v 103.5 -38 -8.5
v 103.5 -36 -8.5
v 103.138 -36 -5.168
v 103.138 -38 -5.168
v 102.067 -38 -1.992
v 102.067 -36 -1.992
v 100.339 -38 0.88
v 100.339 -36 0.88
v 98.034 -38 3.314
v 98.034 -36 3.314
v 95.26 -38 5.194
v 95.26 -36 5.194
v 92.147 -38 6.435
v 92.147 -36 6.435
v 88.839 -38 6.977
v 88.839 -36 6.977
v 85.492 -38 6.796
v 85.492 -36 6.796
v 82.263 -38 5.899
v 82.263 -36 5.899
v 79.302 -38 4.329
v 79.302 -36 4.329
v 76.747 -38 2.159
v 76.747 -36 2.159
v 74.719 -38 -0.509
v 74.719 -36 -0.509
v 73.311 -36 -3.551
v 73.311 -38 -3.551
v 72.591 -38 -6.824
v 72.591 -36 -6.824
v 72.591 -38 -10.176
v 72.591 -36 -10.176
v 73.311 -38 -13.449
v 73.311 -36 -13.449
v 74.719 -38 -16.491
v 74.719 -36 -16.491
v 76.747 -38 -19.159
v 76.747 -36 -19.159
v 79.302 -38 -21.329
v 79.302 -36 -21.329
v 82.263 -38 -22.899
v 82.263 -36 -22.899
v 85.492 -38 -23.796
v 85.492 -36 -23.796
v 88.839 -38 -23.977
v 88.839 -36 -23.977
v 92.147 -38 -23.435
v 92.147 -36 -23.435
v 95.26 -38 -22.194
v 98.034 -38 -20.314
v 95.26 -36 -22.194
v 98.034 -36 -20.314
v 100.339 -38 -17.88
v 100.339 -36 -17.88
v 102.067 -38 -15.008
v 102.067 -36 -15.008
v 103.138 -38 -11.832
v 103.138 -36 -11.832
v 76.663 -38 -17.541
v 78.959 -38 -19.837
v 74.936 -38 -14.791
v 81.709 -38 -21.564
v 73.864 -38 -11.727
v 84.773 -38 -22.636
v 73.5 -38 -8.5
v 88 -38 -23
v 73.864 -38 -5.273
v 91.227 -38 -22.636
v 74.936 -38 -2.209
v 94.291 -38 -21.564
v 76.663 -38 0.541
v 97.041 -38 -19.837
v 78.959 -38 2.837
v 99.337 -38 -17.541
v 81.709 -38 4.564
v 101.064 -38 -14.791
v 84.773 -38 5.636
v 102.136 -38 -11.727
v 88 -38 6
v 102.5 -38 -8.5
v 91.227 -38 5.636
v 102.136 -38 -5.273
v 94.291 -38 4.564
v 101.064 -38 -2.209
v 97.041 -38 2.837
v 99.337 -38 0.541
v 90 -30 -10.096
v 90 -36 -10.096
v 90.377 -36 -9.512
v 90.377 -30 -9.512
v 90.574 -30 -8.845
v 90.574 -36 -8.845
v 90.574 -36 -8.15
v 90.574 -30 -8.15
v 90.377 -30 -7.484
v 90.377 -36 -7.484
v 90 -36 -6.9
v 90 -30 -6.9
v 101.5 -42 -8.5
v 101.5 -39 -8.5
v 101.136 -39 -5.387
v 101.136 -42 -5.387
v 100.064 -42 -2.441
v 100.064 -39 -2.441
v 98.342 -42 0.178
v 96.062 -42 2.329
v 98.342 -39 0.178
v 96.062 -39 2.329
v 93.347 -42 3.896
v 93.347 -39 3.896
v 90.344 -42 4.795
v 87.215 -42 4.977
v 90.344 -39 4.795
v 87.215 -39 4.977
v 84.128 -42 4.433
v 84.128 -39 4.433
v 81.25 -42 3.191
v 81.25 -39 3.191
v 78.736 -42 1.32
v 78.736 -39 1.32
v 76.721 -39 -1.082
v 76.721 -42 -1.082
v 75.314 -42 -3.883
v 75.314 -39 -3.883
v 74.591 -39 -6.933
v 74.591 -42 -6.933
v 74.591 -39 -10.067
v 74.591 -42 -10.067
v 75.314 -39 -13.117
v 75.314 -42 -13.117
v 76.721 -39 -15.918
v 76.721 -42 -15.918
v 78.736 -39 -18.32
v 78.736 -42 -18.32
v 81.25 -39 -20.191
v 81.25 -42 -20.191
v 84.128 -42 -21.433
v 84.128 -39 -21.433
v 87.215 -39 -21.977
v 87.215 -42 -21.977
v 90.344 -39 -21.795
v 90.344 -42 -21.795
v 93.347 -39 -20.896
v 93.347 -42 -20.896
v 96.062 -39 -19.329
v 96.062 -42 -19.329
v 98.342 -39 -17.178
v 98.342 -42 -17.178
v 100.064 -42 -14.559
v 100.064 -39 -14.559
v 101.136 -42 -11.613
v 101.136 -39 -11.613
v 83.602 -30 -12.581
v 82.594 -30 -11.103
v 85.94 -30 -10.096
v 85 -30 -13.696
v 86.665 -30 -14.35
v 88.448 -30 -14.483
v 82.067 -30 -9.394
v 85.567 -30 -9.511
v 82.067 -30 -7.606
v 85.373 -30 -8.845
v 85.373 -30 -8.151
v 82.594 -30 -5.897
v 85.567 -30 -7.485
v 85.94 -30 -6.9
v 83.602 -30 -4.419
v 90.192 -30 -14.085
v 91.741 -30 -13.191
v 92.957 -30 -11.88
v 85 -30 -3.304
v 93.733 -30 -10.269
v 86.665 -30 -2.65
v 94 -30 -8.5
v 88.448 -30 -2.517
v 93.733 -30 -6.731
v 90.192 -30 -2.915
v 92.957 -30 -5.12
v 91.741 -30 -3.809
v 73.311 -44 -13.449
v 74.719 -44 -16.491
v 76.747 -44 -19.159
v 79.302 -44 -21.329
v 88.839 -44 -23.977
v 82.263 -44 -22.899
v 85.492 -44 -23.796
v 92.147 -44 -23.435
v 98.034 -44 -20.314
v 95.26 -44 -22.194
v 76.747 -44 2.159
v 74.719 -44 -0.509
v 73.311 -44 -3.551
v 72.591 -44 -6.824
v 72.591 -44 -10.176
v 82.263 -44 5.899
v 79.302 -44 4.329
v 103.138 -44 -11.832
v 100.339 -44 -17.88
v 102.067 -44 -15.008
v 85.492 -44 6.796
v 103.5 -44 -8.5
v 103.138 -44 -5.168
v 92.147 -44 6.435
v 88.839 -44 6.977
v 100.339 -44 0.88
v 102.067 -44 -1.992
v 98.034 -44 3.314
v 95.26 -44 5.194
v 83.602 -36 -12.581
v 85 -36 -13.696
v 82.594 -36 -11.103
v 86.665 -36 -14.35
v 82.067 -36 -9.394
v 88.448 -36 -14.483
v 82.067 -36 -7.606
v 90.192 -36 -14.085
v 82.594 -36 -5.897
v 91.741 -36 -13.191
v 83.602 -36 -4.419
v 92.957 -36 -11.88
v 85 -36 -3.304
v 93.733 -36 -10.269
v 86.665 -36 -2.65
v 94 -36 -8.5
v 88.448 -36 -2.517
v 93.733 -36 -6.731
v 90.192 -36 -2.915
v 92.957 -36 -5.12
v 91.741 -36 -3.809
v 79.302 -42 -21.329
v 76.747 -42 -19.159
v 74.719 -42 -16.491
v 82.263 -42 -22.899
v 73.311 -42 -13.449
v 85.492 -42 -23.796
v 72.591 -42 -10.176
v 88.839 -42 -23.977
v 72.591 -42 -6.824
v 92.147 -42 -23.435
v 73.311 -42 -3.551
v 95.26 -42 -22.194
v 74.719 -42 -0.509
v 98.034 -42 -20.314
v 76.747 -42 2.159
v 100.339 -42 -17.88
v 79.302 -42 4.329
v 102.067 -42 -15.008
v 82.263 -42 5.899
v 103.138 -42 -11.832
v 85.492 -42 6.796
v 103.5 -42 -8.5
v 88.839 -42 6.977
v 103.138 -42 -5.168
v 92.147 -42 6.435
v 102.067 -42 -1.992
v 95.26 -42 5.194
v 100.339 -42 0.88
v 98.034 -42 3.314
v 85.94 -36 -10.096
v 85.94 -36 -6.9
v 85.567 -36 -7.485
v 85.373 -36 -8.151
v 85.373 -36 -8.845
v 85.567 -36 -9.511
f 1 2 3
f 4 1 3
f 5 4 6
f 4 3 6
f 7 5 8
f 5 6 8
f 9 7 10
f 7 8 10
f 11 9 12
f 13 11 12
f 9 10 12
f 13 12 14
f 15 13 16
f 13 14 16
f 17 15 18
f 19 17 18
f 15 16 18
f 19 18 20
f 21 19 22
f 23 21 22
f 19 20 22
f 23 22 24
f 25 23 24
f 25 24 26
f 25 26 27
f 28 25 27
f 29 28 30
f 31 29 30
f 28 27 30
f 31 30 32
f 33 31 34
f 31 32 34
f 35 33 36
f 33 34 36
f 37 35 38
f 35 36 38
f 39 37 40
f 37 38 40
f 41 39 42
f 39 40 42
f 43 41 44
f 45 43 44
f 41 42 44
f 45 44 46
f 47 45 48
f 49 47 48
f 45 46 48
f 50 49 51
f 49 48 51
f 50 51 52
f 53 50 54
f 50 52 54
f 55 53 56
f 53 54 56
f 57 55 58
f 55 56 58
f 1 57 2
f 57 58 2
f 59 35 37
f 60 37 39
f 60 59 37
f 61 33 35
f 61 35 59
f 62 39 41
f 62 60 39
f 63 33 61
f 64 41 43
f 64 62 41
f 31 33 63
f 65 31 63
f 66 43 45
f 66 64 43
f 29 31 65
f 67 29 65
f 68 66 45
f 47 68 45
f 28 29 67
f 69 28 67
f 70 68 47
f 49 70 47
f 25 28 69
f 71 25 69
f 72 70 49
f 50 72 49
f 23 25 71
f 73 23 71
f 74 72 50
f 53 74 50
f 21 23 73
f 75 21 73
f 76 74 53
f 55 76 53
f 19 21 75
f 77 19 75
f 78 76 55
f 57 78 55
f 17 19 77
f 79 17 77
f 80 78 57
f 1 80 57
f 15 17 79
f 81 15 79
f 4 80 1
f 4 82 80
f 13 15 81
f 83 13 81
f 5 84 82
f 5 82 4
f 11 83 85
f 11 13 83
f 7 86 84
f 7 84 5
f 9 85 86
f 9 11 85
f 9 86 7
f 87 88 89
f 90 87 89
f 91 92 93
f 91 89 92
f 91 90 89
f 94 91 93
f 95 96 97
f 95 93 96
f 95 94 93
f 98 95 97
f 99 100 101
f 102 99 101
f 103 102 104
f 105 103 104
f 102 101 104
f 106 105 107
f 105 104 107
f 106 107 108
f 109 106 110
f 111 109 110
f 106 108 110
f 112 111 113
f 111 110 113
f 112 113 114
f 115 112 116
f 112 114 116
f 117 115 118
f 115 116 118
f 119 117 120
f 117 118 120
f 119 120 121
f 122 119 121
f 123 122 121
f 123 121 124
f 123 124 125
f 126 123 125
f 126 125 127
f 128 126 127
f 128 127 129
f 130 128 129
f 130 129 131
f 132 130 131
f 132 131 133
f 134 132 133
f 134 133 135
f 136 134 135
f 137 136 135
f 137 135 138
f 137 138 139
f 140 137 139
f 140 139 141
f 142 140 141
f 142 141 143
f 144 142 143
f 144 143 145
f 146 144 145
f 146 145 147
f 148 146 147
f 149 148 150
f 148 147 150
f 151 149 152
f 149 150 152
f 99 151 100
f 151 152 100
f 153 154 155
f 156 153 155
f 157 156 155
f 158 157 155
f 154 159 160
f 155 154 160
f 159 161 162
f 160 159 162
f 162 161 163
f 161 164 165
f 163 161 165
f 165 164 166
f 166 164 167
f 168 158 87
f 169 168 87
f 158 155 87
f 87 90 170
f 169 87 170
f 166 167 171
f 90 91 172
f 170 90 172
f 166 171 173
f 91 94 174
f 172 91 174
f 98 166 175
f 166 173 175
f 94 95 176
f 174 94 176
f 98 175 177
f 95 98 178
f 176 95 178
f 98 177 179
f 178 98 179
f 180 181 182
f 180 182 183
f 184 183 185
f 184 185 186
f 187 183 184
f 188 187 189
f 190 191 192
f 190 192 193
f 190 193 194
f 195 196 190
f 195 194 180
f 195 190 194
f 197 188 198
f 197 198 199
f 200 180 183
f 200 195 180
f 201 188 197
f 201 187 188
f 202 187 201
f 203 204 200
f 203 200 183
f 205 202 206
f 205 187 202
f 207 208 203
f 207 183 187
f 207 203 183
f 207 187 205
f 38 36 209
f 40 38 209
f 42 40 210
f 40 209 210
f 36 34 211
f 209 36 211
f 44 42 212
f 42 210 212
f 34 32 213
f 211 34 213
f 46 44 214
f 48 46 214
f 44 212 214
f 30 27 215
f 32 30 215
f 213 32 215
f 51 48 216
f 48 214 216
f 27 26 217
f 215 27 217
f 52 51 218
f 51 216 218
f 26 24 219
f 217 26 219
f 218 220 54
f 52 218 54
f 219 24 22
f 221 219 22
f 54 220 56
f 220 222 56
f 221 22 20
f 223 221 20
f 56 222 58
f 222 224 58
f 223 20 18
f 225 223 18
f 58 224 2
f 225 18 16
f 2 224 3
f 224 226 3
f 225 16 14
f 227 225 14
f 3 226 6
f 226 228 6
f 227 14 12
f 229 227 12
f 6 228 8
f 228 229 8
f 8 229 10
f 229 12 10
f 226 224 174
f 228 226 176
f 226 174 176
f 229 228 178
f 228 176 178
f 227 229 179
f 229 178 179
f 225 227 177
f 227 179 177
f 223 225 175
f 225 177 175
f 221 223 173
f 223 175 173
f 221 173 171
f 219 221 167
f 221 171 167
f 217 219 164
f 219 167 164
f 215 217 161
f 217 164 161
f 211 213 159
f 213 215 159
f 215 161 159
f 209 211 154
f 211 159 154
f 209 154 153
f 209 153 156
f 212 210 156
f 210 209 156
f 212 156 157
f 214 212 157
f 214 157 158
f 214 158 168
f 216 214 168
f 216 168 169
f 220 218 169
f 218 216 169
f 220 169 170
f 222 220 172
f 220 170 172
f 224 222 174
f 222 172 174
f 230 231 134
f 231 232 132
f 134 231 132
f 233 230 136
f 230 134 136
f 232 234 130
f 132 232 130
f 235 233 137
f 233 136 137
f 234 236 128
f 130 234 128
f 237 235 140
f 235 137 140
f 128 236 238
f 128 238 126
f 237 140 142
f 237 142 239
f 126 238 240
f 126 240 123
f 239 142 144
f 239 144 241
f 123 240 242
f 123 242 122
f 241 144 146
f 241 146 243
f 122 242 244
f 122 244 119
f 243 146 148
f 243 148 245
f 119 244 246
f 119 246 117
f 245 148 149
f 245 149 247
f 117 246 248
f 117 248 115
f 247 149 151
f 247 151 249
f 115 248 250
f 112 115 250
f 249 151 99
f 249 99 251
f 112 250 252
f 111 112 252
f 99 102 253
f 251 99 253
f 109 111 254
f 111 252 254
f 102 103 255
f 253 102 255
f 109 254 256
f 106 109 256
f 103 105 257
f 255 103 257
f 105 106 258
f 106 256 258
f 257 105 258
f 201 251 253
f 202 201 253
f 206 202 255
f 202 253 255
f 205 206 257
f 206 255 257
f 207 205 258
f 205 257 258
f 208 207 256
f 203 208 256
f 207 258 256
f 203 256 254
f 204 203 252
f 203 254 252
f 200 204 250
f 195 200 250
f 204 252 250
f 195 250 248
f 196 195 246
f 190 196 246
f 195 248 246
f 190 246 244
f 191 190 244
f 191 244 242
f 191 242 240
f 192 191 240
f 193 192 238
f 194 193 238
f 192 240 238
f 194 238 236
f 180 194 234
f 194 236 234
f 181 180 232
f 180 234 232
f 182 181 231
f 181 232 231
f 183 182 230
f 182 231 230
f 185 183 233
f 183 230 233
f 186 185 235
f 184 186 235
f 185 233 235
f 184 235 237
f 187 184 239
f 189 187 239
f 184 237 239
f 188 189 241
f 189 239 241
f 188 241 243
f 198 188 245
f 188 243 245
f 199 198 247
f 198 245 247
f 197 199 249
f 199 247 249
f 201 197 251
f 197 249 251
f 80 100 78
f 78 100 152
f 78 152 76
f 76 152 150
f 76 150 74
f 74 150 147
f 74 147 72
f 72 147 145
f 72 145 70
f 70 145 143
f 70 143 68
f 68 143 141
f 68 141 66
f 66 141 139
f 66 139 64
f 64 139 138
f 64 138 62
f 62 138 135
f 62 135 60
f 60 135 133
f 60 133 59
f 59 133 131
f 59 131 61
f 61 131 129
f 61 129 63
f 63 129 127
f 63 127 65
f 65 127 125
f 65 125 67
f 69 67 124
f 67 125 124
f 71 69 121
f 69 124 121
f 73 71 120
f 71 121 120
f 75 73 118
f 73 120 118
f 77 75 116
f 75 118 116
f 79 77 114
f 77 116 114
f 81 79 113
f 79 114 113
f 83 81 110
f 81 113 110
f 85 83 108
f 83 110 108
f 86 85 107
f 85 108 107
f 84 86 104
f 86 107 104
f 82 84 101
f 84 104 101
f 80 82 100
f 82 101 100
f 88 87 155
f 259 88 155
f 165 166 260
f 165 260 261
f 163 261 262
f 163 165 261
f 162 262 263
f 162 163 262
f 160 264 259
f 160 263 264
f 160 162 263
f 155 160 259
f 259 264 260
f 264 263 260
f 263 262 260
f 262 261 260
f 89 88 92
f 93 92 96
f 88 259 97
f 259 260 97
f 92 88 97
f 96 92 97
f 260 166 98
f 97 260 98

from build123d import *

# Parameters (mm, degrees)
CYLINDER033_R         = 15.5
CYLINDER033_DEPTH     = 2
CYLINDER032_R         = 13.5
CYLINDER032_DEPTH     = 5
CYLINDER034_R         = 15.5
CYLINDER034_DEPTH     = 2
EXTRUDE001_DEPTH      = 7
CYLINDER031_R         = 6
CYLINDER031_DEPTH     = 14
CHAMFER005_SIZE       = 1
CHAMFER005_ROLL_ANGLE = 90


with BuildPart() as cilindro030:
    # Cylinder033 → Cylinder033 (new body)
    with BuildSketch(Plane(origin=(-1, 25, 36), x_dir=(1, 0, 0), z_dir=(0, 0, 1))):
        Circle(CYLINDER033_R)
    extrude(amount=CYLINDER033_DEPTH)


with BuildPart() as cilindro029:
    # Cylinder032 → Cylinder032 (new body)
    with BuildSketch(Plane(origin=(-1, 25, 31), x_dir=(1, 0, 0), z_dir=(0, 0, 1))):
        Circle(CYLINDER032_R)
    extrude(amount=CYLINDER032_DEPTH)


with BuildPart() as cilindro031:
    # Cylinder034 → Cylinder034 (new body)
    with BuildSketch(Plane(origin=(-1, 25, 30), x_dir=(1, 0, 0), z_dir=(0, 0, 1))):
        Circle(CYLINDER034_R)
    extrude(amount=CYLINDER034_DEPTH)


with BuildPart() as extrude001:
    # Sketch001 → Extrude001 (new body)
    with BuildSketch(Plane.XY):
        with BuildLine():
            Line((-2.060088, 8.599999), (2.000001, 8.599999))
            ThreePointArc((2.000001, 5.404159), (2.598634, 7.002079), (2.000001, 8.599999))
            Line((2.000001, 5.404159), (-2.060088, 5.404159))
            ThreePointArc((-2.060088, 8.599999), (-2.651924, 7.002079), (-2.060088, 5.404159))
        make_face()
    extrude(amount=EXTRUDE001_DEPTH)


with BuildPart() as extrude001_1:
    # Extrude001 placement: moved
    add(extrude001.part.moved(Location((-1, 18, 24))))


with BuildPart() as polea_motor:
    # Cylinder031 → Cylinder031 (new body)
    with BuildSketch(Plane(origin=(-1, 25, 24), x_dir=(1, 0, 0), z_dir=(0, 0, 1))):
        Circle(CYLINDER031_R)
    extrude(amount=CYLINDER031_DEPTH)

    # Cut027: cut Extrude001
    add(extrude001_1.part, mode=Mode.SUBTRACT)

    # Fusion005: union Cilindro030, Cilindro029, Cilindro031
    add(cilindro030.part)
    add(cilindro029.part)
    add(cilindro031.part)

    # Chamfer005
    chamfer005_edges = [polea_motor.edges().sort_by_distance(p)[0] for p in [
        (-14.5, 25, 32),
    ]]
    chamfer(chamfer005_edges, length=CHAMFER005_SIZE)


with BuildPart() as polea_motor_1:
    # Chamfer005 roll: moved
    add(polea_motor.part.rotate(Axis((0, 0, 0), (1, 0, 0)), CHAMFER005_ROLL_ANGLE))


with BuildPart() as polea_motor_2:
    # Chamfer005 placement: moved
    add(polea_motor_1.part.moved(Location((89, -6, -33.5))))


solid = polea_motor_2.part
